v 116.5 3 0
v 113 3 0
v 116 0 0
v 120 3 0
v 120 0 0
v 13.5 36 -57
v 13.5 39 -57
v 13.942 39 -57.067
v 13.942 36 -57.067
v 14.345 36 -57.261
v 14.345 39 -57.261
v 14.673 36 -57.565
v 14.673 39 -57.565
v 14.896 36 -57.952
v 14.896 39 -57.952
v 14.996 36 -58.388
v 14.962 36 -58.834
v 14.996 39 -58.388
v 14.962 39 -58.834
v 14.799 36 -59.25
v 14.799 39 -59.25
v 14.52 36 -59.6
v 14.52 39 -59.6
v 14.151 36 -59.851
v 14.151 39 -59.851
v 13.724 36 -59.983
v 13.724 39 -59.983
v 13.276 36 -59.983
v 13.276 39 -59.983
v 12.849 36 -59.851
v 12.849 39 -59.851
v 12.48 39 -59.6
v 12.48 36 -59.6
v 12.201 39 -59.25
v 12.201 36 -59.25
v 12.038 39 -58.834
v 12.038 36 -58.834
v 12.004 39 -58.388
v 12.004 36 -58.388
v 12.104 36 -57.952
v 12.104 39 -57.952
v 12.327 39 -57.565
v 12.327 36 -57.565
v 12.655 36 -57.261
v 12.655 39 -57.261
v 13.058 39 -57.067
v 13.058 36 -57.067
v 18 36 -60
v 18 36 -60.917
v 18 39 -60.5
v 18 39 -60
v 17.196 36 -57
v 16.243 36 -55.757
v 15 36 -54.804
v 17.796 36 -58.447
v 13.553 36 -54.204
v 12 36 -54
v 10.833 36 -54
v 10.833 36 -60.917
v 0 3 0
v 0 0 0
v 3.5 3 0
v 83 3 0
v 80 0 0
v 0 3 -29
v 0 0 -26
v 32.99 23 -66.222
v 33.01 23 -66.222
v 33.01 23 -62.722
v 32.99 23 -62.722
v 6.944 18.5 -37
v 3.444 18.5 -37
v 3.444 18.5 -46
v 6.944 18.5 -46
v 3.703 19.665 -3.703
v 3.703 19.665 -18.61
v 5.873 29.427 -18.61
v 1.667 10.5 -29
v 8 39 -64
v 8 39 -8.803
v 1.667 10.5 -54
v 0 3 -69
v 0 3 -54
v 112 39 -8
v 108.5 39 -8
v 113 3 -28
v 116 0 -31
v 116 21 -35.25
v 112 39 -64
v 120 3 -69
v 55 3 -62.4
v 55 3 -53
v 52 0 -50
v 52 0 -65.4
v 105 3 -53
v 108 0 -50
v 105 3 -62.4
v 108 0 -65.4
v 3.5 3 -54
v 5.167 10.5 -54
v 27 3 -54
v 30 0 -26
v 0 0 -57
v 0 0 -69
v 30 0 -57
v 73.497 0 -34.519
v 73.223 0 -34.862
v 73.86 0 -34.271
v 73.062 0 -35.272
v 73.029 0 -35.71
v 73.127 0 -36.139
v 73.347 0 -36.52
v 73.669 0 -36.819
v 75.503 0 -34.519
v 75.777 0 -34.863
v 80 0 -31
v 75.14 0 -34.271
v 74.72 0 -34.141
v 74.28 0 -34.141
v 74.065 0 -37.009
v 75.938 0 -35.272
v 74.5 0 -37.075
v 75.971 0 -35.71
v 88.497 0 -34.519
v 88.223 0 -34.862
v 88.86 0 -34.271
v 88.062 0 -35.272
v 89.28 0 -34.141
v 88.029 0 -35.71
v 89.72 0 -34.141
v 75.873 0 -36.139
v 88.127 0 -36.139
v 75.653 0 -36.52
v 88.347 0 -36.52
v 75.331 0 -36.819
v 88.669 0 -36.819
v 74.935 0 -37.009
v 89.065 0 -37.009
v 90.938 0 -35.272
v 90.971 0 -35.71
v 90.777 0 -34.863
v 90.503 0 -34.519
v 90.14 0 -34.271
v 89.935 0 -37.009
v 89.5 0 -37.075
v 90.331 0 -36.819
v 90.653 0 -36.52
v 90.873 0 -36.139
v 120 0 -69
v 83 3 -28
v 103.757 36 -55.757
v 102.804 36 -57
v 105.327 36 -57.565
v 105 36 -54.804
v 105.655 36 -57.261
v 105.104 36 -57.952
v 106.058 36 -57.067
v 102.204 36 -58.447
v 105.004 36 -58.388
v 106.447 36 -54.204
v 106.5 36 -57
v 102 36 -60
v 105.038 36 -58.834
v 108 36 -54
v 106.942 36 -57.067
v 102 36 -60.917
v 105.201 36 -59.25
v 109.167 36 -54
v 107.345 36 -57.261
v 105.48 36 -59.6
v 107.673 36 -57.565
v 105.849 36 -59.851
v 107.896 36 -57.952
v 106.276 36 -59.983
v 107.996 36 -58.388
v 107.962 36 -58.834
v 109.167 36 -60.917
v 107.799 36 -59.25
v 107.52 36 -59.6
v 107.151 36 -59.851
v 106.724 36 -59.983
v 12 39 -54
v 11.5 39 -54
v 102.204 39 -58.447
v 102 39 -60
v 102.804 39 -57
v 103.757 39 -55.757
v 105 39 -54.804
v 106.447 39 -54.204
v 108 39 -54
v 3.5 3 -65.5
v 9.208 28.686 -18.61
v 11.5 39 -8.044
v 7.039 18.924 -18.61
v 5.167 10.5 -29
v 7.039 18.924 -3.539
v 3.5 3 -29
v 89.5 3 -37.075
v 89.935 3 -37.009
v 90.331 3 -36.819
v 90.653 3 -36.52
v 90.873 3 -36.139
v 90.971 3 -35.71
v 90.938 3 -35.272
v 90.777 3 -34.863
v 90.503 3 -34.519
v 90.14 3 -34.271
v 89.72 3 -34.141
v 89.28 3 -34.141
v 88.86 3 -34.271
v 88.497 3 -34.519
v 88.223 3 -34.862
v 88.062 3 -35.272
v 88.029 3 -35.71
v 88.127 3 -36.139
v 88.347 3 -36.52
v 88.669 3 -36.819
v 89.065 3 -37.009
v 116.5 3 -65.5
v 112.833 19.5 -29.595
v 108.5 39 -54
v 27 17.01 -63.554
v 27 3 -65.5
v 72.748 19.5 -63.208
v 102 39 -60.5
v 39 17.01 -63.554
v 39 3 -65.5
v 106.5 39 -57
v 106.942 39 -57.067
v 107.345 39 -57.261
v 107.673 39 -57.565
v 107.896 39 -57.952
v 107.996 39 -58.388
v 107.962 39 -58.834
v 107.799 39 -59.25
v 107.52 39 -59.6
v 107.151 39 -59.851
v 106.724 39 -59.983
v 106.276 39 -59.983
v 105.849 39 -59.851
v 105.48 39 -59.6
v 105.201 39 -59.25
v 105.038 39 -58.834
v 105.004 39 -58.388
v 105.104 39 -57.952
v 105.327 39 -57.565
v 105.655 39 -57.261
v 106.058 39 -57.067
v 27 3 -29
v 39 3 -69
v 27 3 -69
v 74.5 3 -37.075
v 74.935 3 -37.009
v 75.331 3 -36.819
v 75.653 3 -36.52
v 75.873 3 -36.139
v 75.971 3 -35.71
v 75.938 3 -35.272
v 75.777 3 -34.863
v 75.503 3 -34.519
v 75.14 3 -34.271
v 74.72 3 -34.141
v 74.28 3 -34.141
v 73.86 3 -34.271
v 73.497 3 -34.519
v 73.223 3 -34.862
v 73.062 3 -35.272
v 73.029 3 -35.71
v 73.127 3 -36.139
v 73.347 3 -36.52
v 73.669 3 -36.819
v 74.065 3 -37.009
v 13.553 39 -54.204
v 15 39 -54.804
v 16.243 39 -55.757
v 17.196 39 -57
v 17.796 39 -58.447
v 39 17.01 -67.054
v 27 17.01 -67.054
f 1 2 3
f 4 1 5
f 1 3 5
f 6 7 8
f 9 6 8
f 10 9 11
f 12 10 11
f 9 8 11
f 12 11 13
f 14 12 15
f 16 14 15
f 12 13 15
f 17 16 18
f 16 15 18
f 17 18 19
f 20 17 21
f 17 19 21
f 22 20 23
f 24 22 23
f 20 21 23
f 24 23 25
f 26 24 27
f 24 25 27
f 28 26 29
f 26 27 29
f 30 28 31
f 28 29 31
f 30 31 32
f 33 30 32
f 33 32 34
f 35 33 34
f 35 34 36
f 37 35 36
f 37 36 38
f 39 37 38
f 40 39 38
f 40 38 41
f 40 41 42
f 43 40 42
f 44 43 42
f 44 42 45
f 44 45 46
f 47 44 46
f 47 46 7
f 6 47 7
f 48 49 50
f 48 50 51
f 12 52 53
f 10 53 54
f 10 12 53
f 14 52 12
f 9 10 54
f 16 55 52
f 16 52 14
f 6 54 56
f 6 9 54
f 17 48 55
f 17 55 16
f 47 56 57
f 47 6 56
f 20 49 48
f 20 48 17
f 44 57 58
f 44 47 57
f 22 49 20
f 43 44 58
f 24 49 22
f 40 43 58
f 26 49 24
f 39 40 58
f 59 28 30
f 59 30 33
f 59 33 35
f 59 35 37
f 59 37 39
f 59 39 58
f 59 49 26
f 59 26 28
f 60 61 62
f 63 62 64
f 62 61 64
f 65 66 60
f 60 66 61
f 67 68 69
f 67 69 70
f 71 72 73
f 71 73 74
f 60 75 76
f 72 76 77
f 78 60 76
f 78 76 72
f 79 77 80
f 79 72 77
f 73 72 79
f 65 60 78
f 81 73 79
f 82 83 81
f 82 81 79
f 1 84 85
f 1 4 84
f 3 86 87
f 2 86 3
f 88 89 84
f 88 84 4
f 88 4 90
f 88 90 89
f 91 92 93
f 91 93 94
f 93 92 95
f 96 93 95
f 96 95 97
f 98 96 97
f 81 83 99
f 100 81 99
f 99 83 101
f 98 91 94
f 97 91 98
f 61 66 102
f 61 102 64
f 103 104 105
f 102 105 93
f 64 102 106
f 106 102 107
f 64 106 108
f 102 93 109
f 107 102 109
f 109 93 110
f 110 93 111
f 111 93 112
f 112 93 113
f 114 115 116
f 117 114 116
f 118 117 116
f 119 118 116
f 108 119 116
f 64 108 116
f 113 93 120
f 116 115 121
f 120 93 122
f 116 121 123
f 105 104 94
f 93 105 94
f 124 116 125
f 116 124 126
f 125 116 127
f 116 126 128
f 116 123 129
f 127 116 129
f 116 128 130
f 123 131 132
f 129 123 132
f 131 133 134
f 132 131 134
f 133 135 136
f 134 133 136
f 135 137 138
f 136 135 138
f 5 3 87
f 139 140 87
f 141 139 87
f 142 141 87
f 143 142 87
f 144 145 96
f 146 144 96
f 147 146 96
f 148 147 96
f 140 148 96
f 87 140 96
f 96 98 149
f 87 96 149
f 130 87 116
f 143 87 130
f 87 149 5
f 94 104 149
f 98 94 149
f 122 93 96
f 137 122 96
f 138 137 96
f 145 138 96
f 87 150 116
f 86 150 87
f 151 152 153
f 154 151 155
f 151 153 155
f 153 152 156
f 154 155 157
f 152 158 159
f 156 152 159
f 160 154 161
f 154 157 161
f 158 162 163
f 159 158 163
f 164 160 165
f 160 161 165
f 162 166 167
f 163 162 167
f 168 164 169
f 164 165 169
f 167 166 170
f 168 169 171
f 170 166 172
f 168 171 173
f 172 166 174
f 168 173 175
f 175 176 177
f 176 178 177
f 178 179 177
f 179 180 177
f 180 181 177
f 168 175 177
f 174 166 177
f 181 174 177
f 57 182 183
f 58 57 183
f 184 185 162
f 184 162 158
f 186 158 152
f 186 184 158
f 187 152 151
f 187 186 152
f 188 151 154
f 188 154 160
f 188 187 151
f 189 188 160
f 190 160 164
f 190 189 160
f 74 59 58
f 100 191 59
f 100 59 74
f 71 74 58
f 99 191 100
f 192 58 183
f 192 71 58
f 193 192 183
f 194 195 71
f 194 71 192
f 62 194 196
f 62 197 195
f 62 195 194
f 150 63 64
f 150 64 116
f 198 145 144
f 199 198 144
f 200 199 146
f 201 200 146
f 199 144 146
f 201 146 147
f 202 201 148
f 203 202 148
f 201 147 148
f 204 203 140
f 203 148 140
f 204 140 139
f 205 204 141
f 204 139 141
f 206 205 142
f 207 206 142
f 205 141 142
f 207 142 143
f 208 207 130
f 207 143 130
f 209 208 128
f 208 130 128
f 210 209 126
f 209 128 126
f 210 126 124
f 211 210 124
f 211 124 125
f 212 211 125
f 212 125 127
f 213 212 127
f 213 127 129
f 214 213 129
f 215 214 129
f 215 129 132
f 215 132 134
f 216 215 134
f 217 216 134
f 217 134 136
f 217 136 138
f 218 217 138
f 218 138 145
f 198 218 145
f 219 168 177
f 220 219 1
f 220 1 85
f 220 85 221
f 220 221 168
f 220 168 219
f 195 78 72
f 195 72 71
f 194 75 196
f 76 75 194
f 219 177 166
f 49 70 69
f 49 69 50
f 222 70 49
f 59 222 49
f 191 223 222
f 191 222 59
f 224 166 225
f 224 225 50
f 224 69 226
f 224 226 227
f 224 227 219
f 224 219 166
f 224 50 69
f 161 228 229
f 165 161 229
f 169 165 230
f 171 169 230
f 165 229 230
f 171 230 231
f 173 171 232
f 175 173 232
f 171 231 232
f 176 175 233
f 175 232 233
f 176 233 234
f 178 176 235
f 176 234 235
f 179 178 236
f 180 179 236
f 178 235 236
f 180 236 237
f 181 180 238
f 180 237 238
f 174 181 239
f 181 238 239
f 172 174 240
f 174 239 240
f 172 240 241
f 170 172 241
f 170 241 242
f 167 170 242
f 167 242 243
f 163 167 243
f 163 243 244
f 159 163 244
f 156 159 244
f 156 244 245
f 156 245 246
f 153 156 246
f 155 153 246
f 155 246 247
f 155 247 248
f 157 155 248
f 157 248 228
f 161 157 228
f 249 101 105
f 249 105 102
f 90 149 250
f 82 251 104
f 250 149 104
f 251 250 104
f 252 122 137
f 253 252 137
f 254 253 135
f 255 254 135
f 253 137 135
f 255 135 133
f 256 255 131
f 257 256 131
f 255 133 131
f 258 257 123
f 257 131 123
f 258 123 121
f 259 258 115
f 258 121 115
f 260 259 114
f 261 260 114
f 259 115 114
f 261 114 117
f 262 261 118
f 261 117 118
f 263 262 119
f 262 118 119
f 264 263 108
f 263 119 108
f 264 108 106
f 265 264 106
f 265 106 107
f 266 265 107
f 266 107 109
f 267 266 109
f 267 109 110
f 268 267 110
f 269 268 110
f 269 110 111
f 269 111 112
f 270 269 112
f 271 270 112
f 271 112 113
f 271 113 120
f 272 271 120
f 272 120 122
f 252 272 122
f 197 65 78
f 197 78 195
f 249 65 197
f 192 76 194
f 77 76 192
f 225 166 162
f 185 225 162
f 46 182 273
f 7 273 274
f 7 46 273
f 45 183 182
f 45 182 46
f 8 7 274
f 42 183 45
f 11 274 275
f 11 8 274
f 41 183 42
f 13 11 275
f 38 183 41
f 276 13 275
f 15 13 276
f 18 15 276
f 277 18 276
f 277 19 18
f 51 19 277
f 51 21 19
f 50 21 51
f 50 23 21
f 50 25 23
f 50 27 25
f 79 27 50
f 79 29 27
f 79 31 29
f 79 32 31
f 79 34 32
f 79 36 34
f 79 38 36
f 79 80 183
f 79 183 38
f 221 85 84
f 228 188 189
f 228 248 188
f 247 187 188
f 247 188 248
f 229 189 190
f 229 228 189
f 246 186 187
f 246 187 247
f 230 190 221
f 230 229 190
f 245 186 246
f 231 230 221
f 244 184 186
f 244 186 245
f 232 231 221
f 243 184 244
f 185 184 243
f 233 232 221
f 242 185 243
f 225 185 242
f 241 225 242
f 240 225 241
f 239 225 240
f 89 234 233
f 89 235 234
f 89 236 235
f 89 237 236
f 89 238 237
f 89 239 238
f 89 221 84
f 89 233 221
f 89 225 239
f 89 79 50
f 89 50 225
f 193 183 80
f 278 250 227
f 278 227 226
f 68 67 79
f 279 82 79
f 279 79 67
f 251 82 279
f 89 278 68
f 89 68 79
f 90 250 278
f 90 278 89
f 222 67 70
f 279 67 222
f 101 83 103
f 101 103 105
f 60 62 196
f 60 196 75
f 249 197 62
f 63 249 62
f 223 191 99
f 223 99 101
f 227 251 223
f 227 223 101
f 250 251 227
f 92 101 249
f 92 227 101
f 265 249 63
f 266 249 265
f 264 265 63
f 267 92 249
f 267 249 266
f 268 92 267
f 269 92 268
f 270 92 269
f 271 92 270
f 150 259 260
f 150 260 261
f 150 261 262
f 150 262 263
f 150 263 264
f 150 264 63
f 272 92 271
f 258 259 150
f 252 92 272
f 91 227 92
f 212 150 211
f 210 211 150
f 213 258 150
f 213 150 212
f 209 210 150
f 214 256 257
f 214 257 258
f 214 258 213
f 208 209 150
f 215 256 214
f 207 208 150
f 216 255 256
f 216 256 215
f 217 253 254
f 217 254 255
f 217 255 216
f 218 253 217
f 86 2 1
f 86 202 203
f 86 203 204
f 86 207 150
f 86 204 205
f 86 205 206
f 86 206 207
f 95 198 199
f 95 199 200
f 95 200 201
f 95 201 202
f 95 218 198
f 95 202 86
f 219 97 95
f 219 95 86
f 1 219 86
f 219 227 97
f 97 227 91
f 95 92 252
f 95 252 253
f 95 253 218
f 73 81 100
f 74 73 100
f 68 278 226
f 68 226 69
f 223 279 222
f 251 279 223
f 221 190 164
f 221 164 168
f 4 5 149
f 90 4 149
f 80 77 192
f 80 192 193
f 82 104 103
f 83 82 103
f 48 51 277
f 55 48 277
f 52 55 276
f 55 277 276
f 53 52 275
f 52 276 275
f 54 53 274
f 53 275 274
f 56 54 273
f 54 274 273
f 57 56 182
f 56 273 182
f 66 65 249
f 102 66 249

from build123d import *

# Parameters (mm, degrees)
SKETCH2_W           = 50
SKETCH2_H           = 9.4
BOSS_EXTRUDE1_DEPTH = 3
BOSS_EXTRUDE2_DEPTH = 3
CUT_EXTRUDE1_REACH  = 145.812
SKETCH6_R           = 1.5
SKETCH7_W           = 33
SKETCH7_H           = 25
CUT_EXTRUDE2_DEPTH  = 18.5
CHAMFER1_SIZE       = 3
CUT_EXTRUDE4_REACH  = 145.812
CHAMFER2_SIZE       = 3
CHAMFER3_SIZE       = 3
CUT_EXTRUDE5_REACH  = 145.812
SKETCH9_R           = 1.475
CUT_EXTRUDE6_REACH  = 146.305
CHAMFER4_SIZE       = 8


with BuildPart() as part:
    # Sketch2 → Boss-Extrude1 (new body)
    with BuildSketch(Plane(origin=(0, 0, 0), x_dir=(1, 0, 0), z_dir=(0, 1, 0))):
        Polygon((113, 0), (120, 0), (120, 69), (0, 69), (0, 0), (83, 0), (83, 28), (113, 28), align=None)
        with Locations((80, 57.7)):
            Rectangle(SKETCH2_W, SKETCH2_H, mode=Mode.SUBTRACT)
    extrude(amount=BOSS_EXTRUDE1_DEPTH)

    # Sketch4 → Loft1 section 0
    with BuildSketch(Plane(origin=(0, 39, 0), x_dir=(1, 0, 0), z_dir=(0, 1, 0))):
        with BuildLine():
            Line((11.5, 8), (8, 8))
            Line((8, 8), (8, 64))
            Line((8, 64), (112, 64))
            Line((112, 64), (112, 8))
            Line((112, 8), (108.5, 8))
            Line((108.5, 8), (108.5, 60.5))
            Line((108.5, 60.5), (11.5, 60.5))
            Line((11.5, 60.5), (11.5, 8))
        make_face()
    # Sketch3 → Loft1 section 1
    with BuildSketch(Plane(origin=(0, 3, 0), x_dir=(1, 0, 0), z_dir=(0, 1, 0))):
        with BuildLine():
            Line((3.5, 0), (3.5, 65.5))
            Line((3.5, 65.5), (116.5, 65.5))
            Line((116.5, 65.5), (116.5, 0))
            Line((116.5, 0), (120, 0))
            Line((120, 0), (120, 69))
            Line((120, 69), (0, 69))
            Line((0, 69), (0, 0))
            Line((0, 0), (3.5, 0))
        make_face()
    loft()

    # Sketch5 → Boss-Extrude2 (add)
    with BuildSketch(Plane(origin=(0, 39, 0), x_dir=(1, 0, 0), z_dir=(0, 1, 0))):
        with BuildLine():
            Line((8, 64), (18, 64))
            Line((18, 64), (18, 60))
            ThreePointArc((18, 60), (16.242640687, 55.757359313), (12, 54))
            Line((12, 54), (8, 54))
            Line((8, 54), (8, 64))
        make_face()
        with BuildLine():
            Line((112, 64), (102, 64))
            Line((102, 64), (102, 60))
            ThreePointArc((102, 60), (103.757359313, 55.757359313), (108, 54))
            Line((108, 54), (112, 54))
            Line((112, 54), (112, 64))
        make_face()
    extrude(amount=-BOSS_EXTRUDE2_DEPTH)

    # Sketch6 → Cut-Extrude1 (cut, up to next)
    with BuildSketch(Plane(origin=(0, 39, 0), x_dir=(1, 0, 0), z_dir=(0, 1, 0)), mode=Mode.PRIVATE) as cut_extrude1_sk1:
        with Locations(Location((13.5, 58.5, 0), (0, 0, 270))):
            Circle(SKETCH6_R)
    cut_extrude1_tool1 = extrude(cut_extrude1_sk1.sketch, amount=-CUT_EXTRUDE1_REACH, mode=Mode.PRIVATE) & part.part
    # Sketch6 → Cut-Extrude1 (cut, up to next)
    with BuildSketch(Plane(origin=(0, 39, 0), x_dir=(1, 0, 0), z_dir=(0, 1, 0)), mode=Mode.PRIVATE) as cut_extrude1_sk2:
        with Locations(Location((106.5, 58.5, 0), (0, 0, 270))):
            Circle(SKETCH6_R)
    cut_extrude1_tool2 = extrude(cut_extrude1_sk2.sketch, amount=-CUT_EXTRUDE1_REACH, mode=Mode.PRIVATE) & part.part
    add(cut_extrude1_tool1.solids().sort_by_distance((13.5, 39, -58.5))[0], mode=Mode.SUBTRACT)
    add(cut_extrude1_tool2.solids().sort_by_distance((106.5, 39, -58.5))[0], mode=Mode.SUBTRACT)

    # Sketch7 → Cut-Extrude2 (cut)
    with BuildSketch(Plane.XZ):
        with Locations((10.5, -41.5)):
            Rectangle(SKETCH7_W, SKETCH7_H)
    extrude(amount=-CUT_EXTRUDE2_DEPTH, mode=Mode.SUBTRACT)

    # Chamfer1
    chamfer1_edges = [part.edges().sort_by_distance(p)[0] for p in [
        (55, 0, -57.7),
        (80, 0, -62.4),
        (105, 0, -57.7),
        (80, 0, -53),
    ]]
    chamfer(chamfer1_edges, length=CHAMFER1_SIZE - 0.0001)  # a hair under: the kernel refuses the full size

    # Cut-Extrude4: up to this plane
    cut_extrude4_end = Plane(origin=(0, 8.981831945, -64.669190008), z_dir=(0, -0.1375683712746883, 0.9904922731777515))
    # Sketch8 → Cut-Extrude4 (cut, up to the surface)
    with BuildSketch(Plane(origin=(0, 0, -69), x_dir=(-1, 0, 0), z_dir=(0, 0, -1)), mode=Mode.PRIVATE) as cut_extrude4_sk1:
        Polygon((-27, 3), (-39, 3), (-39, 17.01), (-33.01, 23), (-32.99, 23), (-27, 17.01), align=None)
    cut_extrude4_tool1 = split(extrude(cut_extrude4_sk1.sketch, amount=-CUT_EXTRUDE4_REACH, mode=Mode.PRIVATE), bisect_by=cut_extrude4_end, keep=Keep.BOTH, mode=Mode.PRIVATE)
    add(cut_extrude4_tool1.solids().sort_by_distance((33, 11.593178, -69))[0], mode=Mode.SUBTRACT)

    # Chamfer2
    chamfer2_edges = [part.edges().sort_by_distance(p)[0] for p in [
        (83, 0, -14),
        (113, 0, -14),
        (98, 0, -28),
    ]]
    chamfer(chamfer2_edges, length=CHAMFER2_SIZE - 0.0001)  # a hair under: the kernel refuses the full size

    # Chamfer3
    chamfer3_edges = [part.edges().sort_by_distance(p)[0] for p in [
        (13.5, 0, -54),
        (27, 0, -41.5),
        (13.5, 0, -29),
    ]]
    chamfer(chamfer3_edges, length=CHAMFER3_SIZE - 0.0001)  # a hair under: the kernel refuses the full size

    # Sketch9 → Cut-Extrude5 (cut, up to next)
    with BuildSketch(Plane.XZ, mode=Mode.PRIVATE) as cut_extrude5_sk1:
        with Locations(Location((89.5, -35.6, 0), (0, 0, 270))):
            Circle(SKETCH9_R)
    cut_extrude5_tool1 = extrude(cut_extrude5_sk1.sketch, amount=-CUT_EXTRUDE5_REACH, mode=Mode.PRIVATE) & part.part
    # Sketch9 → Cut-Extrude5 (cut, up to next)
    with BuildSketch(Plane.XZ, mode=Mode.PRIVATE) as cut_extrude5_sk2:
        with Locations(Location((74.5, -35.6, 0), (0, 0, 270))):
            Circle(SKETCH9_R)
    cut_extrude5_tool2 = extrude(cut_extrude5_sk2.sketch, amount=-CUT_EXTRUDE5_REACH, mode=Mode.PRIVATE) & part.part
    add(cut_extrude5_tool1.solids().sort_by_distance((89.5, 0, -35.6))[0], mode=Mode.SUBTRACT)
    add(cut_extrude5_tool2.solids().sort_by_distance((74.5, 0, -35.6))[0], mode=Mode.SUBTRACT)

    # Sketch10 → Cut-Extrude6 (cut, up to next)
    with BuildSketch(Plane(origin=(-0.635294118, 0.141176471, 0), x_dir=(0, 0, 1), z_dir=(-0.9761870601839528, 0.21693045781865627, 0)), mode=Mode.PRIVATE) as cut_extrude6_sk1:
        Polygon((-0.780111958, 20), (-18.610201871, 20), (-18.610201871, 30), (-7.717228125, 40.892973746), align=None)
    cut_extrude6_tool1 = extrude(cut_extrude6_sk1.sketch, amount=-CUT_EXTRUDE6_REACH, mode=Mode.PRIVATE) & part.part
    add(cut_extrude6_tool1.solids().sort_by_distance((5.377692, 27.199615, -10.380545))[0], mode=Mode.SUBTRACT)

    # Chamfer4
    chamfer4_edges = [part.edges().sort_by_distance(p)[0] for p in [
        (5.194444444, 18.5, -29),
        (5.194444444, 18.5, -54),
    ]]
    chamfer(chamfer4_edges, length=CHAMFER4_SIZE)


solid = part.part
